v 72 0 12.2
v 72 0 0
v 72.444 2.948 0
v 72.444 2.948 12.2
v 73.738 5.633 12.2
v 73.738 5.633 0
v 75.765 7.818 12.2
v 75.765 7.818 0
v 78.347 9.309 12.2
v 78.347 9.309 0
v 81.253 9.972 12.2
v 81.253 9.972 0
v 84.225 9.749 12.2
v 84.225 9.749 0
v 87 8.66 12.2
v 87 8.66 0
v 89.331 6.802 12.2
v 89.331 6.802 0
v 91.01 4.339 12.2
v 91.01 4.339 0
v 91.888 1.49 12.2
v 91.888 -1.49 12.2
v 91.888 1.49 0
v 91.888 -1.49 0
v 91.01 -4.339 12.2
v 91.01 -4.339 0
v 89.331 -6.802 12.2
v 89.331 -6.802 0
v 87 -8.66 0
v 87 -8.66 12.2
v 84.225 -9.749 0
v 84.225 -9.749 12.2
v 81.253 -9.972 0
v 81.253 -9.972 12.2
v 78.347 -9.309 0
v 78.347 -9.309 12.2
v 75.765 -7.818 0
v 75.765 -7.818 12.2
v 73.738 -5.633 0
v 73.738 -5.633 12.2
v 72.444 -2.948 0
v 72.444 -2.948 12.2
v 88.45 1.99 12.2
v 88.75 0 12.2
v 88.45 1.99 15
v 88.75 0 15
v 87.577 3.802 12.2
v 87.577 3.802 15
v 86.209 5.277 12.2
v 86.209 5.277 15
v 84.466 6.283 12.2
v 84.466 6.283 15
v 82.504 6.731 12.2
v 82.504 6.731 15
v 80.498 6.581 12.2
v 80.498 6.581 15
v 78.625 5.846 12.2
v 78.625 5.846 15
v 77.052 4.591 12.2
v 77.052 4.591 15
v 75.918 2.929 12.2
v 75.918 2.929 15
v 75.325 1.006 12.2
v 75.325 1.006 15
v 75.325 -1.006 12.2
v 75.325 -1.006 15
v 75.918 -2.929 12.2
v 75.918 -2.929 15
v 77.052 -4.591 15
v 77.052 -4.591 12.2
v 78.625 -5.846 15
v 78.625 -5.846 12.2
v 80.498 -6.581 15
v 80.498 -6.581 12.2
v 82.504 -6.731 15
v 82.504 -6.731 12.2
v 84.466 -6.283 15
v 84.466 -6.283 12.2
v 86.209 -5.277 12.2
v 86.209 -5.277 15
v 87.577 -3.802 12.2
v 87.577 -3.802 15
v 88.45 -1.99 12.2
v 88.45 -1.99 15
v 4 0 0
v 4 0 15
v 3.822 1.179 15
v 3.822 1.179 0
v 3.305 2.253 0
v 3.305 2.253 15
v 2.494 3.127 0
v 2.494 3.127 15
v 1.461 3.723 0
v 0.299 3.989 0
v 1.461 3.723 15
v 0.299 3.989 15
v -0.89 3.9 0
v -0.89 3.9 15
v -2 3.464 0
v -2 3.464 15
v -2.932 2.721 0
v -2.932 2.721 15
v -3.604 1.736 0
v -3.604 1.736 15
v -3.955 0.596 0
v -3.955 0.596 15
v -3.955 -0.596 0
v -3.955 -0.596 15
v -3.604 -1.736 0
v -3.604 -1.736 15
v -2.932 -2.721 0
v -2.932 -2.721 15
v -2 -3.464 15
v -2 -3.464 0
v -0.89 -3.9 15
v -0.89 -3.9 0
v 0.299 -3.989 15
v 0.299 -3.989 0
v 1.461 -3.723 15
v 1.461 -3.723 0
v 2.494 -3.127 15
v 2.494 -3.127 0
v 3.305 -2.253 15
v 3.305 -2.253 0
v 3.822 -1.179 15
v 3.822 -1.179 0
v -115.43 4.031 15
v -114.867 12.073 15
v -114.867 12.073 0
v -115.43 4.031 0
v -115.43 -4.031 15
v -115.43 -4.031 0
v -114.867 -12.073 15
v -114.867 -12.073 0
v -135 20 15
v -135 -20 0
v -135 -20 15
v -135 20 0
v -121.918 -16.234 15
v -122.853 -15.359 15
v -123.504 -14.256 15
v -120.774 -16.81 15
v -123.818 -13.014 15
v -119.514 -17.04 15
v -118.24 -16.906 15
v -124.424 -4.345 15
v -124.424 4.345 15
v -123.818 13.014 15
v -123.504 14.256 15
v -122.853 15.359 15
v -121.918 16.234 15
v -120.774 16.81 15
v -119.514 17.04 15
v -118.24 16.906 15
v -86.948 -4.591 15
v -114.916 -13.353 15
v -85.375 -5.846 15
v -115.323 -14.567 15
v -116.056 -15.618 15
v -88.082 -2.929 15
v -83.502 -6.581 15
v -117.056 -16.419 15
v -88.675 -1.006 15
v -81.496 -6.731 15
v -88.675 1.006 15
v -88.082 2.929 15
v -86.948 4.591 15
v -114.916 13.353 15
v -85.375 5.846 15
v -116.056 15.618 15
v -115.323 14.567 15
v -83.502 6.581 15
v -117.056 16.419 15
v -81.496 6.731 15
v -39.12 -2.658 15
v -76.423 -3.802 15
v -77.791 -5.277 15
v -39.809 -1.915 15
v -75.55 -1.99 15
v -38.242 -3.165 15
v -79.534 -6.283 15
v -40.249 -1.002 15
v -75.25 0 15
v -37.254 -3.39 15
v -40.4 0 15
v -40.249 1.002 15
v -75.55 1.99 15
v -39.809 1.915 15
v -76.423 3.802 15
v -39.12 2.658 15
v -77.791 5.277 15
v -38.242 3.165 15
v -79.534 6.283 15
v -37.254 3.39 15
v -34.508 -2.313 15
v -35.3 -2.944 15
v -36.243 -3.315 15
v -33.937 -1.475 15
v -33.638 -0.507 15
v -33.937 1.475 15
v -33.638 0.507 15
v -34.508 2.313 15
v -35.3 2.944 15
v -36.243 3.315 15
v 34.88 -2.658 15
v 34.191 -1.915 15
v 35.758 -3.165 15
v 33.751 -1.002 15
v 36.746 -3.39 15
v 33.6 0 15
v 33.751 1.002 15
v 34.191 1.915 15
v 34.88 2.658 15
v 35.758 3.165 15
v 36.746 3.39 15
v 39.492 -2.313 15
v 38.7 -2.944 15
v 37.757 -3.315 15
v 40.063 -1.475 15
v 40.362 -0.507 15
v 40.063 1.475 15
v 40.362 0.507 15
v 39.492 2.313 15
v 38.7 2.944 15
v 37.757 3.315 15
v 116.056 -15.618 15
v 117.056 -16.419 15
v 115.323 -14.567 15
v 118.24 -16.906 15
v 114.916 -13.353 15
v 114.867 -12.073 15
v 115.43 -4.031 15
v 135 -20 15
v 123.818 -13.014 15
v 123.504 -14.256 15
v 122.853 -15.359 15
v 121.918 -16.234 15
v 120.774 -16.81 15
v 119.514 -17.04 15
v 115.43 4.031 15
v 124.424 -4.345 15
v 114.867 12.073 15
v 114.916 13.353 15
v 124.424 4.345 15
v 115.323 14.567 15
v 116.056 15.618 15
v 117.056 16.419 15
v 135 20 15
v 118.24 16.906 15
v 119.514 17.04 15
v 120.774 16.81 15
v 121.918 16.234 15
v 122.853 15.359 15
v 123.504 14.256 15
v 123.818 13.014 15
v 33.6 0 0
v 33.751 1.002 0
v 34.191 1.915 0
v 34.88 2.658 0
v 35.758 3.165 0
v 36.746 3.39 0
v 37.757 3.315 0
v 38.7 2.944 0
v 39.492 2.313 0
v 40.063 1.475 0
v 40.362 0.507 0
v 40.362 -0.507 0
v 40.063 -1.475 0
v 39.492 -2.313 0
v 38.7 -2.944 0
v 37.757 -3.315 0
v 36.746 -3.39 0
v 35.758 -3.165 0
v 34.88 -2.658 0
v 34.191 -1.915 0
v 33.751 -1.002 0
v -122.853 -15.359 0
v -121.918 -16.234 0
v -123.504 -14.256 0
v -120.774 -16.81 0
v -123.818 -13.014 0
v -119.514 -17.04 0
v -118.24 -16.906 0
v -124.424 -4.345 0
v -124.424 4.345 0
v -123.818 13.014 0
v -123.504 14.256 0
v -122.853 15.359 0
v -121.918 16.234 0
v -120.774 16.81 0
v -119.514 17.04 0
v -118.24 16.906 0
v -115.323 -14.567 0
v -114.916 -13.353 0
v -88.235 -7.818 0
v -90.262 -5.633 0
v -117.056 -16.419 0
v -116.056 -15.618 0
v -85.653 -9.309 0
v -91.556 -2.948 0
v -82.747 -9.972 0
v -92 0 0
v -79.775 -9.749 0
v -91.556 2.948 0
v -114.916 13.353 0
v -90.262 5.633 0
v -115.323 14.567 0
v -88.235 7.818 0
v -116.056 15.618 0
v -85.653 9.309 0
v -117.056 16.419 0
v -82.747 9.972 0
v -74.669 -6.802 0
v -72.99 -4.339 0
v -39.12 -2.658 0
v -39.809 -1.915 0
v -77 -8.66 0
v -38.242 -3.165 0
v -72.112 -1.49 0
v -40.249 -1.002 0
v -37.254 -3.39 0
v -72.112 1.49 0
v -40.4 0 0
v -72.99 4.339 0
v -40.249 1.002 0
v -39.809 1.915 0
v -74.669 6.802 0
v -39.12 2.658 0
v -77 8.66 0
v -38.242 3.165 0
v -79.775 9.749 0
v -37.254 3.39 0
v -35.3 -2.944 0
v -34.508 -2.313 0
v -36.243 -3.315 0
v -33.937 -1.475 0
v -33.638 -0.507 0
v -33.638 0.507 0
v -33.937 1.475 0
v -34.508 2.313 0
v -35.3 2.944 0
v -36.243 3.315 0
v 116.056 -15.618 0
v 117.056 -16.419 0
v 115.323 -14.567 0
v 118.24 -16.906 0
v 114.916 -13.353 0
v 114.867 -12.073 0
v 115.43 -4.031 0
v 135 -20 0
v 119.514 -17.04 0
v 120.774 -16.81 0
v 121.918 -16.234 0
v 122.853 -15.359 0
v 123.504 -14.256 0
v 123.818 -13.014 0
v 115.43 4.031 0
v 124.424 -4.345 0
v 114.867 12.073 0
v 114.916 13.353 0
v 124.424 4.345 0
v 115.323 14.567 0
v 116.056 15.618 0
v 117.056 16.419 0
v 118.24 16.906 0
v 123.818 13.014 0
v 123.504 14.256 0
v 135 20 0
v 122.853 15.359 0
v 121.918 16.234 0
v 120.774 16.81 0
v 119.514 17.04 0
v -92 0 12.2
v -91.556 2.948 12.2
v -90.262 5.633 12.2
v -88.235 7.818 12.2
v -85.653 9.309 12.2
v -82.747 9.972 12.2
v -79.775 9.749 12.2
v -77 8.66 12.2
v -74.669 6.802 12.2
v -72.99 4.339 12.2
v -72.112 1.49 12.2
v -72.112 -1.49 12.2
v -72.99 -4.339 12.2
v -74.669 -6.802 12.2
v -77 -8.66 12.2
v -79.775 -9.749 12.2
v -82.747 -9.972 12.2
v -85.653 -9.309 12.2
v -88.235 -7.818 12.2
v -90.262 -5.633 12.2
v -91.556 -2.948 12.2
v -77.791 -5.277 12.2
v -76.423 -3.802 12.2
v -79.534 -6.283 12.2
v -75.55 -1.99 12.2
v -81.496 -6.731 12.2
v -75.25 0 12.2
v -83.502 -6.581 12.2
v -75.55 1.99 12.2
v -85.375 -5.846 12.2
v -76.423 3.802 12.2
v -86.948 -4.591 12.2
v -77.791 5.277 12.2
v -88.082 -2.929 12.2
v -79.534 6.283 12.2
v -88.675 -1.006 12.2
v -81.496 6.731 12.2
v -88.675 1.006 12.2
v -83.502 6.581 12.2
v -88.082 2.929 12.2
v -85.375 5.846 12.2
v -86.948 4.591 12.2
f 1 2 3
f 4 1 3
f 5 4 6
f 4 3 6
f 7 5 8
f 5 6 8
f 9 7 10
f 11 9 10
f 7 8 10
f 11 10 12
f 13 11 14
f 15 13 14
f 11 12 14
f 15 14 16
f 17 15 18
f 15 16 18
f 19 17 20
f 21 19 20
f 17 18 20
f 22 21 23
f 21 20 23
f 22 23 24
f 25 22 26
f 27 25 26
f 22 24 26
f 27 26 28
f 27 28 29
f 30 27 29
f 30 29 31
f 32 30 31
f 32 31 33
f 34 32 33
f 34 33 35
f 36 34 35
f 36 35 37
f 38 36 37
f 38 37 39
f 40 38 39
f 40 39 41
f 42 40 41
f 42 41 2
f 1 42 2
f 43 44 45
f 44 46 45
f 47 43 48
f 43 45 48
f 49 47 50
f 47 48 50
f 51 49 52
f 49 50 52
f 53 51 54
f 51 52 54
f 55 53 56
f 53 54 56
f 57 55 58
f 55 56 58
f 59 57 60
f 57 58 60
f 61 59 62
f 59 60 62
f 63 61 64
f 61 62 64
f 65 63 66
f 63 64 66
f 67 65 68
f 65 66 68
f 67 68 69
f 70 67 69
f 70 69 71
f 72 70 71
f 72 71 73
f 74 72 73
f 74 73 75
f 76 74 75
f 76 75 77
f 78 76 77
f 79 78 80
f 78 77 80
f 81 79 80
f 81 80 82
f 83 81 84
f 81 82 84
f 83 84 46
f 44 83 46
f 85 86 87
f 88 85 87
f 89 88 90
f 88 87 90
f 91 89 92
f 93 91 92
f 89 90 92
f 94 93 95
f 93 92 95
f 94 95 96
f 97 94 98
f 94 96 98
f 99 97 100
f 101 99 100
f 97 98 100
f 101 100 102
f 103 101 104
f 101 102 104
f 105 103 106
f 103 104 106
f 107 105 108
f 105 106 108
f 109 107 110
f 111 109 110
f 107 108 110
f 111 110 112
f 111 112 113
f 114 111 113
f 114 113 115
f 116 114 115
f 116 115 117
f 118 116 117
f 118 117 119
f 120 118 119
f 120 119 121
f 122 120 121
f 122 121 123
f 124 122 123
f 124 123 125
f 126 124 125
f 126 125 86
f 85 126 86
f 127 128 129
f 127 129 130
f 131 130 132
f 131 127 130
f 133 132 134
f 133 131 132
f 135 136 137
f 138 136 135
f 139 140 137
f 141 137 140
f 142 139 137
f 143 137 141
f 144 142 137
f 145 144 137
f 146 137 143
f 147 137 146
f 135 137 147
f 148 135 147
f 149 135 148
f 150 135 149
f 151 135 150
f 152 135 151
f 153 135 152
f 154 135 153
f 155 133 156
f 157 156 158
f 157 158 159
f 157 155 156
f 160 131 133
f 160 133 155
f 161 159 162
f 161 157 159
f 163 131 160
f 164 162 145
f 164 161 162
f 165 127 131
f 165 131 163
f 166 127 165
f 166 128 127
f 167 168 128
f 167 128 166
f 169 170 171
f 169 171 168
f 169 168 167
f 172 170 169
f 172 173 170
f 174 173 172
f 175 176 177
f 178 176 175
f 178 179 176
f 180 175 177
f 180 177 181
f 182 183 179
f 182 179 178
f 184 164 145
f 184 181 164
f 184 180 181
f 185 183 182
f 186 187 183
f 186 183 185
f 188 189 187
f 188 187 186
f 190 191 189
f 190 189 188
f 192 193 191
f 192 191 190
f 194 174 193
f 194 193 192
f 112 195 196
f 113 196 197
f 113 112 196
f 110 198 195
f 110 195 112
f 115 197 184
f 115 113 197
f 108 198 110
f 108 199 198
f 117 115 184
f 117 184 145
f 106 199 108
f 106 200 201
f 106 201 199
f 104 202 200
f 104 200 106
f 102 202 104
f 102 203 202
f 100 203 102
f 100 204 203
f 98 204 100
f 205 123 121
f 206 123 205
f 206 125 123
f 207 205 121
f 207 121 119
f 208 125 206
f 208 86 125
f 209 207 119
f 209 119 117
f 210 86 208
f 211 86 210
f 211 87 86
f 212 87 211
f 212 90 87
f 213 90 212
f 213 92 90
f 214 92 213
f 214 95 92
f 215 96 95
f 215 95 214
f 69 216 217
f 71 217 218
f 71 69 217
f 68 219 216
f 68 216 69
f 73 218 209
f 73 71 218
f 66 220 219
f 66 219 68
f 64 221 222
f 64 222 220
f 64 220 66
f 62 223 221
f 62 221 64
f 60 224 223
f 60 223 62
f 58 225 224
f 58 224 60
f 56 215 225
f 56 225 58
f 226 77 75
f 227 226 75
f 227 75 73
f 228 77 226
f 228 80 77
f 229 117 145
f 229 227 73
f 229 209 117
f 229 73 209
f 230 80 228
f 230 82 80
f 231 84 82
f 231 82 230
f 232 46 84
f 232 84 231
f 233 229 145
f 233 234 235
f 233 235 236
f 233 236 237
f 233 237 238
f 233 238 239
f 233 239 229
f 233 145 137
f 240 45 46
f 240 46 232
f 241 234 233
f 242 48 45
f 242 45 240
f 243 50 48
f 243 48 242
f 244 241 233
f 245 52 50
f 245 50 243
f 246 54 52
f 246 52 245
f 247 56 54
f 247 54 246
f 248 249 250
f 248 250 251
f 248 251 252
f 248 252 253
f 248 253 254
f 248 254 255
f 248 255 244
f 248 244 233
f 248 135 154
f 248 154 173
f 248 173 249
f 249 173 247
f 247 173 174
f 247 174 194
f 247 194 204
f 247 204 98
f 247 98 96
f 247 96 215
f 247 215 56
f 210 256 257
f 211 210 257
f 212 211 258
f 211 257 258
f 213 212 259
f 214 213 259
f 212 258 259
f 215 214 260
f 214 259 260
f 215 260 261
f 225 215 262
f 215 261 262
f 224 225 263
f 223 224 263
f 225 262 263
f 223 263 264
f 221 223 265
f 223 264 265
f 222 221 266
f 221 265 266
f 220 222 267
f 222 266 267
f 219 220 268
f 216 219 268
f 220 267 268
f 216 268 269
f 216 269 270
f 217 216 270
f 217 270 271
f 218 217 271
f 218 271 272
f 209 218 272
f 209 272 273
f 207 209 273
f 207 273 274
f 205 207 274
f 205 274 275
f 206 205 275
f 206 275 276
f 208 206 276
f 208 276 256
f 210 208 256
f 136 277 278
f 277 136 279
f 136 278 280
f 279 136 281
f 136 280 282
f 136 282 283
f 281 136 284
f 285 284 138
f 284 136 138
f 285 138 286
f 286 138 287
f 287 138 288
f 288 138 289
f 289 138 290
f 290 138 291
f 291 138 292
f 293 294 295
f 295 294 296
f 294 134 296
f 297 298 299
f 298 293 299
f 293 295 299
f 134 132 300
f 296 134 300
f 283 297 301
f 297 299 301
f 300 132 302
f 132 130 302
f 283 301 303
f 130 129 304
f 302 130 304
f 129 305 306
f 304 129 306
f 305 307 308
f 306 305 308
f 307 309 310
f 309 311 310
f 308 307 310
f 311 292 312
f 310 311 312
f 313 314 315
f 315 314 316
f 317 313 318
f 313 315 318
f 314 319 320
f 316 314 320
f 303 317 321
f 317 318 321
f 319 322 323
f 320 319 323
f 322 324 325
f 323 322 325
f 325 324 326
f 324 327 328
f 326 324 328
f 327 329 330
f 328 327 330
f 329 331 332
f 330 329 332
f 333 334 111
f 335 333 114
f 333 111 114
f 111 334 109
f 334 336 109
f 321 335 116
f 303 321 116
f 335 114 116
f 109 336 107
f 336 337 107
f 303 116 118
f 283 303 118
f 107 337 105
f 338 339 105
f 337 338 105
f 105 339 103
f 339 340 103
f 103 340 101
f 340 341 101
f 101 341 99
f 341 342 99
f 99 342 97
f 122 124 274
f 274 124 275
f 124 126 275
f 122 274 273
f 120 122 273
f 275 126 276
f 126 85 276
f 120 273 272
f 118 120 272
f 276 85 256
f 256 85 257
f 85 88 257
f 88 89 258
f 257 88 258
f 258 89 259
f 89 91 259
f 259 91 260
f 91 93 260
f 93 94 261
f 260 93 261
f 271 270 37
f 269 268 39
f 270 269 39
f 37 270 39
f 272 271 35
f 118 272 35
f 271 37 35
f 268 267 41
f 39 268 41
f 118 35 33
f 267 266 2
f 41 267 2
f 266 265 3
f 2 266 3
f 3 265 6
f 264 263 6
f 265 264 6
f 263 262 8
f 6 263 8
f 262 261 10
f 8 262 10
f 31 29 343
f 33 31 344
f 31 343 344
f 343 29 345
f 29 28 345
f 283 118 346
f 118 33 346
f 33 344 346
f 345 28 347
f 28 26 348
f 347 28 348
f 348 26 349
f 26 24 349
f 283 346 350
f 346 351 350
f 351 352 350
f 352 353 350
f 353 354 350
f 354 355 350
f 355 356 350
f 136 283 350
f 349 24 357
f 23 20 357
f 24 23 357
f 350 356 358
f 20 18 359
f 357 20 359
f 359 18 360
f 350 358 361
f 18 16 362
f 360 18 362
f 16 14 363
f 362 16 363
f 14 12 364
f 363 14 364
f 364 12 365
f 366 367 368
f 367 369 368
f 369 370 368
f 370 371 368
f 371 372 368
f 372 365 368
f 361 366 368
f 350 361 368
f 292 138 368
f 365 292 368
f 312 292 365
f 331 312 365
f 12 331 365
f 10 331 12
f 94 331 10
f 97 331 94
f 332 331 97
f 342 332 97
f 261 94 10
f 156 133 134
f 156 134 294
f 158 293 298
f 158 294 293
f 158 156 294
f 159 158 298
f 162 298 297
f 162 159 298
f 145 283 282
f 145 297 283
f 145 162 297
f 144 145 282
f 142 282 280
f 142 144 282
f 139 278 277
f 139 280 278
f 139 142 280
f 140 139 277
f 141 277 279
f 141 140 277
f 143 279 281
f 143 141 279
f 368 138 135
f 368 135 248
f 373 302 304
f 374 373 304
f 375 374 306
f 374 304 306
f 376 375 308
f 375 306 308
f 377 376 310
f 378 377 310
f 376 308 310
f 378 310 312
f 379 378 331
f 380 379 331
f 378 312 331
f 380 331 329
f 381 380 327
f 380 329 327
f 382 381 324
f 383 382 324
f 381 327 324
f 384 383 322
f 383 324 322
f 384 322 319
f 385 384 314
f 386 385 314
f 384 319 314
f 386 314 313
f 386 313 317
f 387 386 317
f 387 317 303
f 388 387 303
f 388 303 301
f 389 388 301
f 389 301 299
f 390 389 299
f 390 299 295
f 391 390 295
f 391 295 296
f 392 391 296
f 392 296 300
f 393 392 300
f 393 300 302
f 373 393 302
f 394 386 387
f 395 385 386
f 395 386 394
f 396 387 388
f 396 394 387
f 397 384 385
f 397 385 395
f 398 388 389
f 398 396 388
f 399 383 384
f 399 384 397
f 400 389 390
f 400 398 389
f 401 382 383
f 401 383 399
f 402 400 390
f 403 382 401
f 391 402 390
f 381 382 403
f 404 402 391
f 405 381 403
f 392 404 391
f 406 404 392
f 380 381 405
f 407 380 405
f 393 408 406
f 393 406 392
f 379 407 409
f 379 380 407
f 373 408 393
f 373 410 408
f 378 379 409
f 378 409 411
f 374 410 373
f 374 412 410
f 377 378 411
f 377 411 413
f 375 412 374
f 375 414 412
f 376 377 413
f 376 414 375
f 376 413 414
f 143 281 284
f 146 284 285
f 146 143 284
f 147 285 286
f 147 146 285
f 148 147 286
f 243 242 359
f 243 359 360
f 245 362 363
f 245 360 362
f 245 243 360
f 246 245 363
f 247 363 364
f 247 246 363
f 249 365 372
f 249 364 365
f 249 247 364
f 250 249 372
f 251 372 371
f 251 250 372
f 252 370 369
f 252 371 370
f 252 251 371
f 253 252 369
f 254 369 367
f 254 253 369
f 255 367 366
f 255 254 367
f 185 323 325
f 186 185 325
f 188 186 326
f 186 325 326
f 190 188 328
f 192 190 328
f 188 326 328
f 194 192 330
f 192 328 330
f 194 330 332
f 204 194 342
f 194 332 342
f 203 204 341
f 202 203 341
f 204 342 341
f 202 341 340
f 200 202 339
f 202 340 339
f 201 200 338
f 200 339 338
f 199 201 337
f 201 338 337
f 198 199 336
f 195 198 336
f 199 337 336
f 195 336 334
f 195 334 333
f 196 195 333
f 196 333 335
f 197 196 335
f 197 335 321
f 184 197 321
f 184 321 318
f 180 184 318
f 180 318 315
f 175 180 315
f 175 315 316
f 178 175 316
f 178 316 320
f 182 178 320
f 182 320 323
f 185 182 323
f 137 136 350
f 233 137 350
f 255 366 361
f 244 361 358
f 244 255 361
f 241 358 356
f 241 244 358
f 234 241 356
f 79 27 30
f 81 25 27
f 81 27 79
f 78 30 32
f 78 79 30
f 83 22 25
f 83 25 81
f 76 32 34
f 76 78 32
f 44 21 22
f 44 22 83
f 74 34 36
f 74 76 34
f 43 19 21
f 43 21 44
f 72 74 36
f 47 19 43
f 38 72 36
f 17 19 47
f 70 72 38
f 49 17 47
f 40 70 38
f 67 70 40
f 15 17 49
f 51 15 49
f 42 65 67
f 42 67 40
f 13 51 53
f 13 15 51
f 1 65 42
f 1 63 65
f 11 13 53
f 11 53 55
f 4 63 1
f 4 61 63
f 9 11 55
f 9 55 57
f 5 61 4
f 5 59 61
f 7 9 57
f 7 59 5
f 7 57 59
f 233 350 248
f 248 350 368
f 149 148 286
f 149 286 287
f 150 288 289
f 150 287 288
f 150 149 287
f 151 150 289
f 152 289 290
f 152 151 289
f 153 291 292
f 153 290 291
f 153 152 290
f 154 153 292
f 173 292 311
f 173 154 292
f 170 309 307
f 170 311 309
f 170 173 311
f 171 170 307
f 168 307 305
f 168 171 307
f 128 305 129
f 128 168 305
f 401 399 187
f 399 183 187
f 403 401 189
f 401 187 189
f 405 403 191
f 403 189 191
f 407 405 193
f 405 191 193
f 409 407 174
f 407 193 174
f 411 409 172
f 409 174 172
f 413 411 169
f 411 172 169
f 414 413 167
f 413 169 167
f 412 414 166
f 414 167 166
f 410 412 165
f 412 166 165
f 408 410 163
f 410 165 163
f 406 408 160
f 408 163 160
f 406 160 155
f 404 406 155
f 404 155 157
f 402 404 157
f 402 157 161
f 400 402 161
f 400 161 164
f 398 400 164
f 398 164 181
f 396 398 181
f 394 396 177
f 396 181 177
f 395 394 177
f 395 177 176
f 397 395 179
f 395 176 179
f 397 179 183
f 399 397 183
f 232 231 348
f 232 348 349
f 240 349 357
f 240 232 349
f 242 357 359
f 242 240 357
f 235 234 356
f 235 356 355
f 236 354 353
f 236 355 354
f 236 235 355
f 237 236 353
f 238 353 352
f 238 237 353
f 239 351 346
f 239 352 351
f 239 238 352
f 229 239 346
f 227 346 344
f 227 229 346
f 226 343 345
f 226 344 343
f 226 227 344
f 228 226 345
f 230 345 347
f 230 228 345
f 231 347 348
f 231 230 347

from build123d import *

# Parameters (mm, degrees)
SKETCH_1_W                = 270
SKETCH_1_H                = 40
EXTRUDE_1_DEPTH           = 15
HOLE_WIZARD_1_D           = 13.5
HOLE_WIZARD_1_CBORE_D     = 20
HOLE_WIZARD_1_CBORE_DEPTH = 12.2
CUT_EXTRUDE_1_DEPTH       = 138.295302177
HOLE_WIZARD_M8_1_D        = 6.8
HOLE_WIZARD_1_2_D         = 8


with BuildPart() as part:
    # 草图1 → 凸台-拉伸1 (new body)
    with BuildSketch(Plane.XY):
        Rectangle(SKETCH_1_W, SKETCH_1_H)
    extrude(amount=EXTRUDE_1_DEPTH)

    # Hole Wizard 1 (through all)
    with Locations(Plane(origin=(0, 0, 0), x_dir=(-1, 0, 0), z_dir=(0, 0, -1))):
        with Locations((-82, 0), (82, 0)):
            CounterBoreHole(HOLE_WIZARD_1_D / 2, HOLE_WIZARD_1_CBORE_D / 2, HOLE_WIZARD_1_CBORE_DEPTH)

    # 草图4 → 切除-拉伸1 (cut, through all)
    with BuildSketch(Plane.XY.offset(15)):
        with BuildLine():
            ThreePointArc((114.867278915, -12.073037507), (115.5, 0), (114.867278915, 12.073037507))
            ThreePointArc((114.867278915, 12.073037507), (118.872249359, 17.018764121), (123.817975973, 13.013793677))
            ThreePointArc((123.817975973, 13.013793677), (124.5, 0), (123.817975973, -13.013793677))
            ThreePointArc((123.817975973, -13.013793677), (118.872249359, -17.018764121), (114.867278915, -12.073037507))
        make_face()
        with BuildLine():
            ThreePointArc((-114.867278915, -12.073037507), (-118.872249359, -17.018764121), (-123.817975973, -13.013793677))
            ThreePointArc((-123.817975973, -13.013793677), (-124.5, 0), (-123.817975973, 13.013793677))
            ThreePointArc((-123.817975973, 13.013793677), (-118.872249359, 17.018764121), (-114.867278915, 12.073037507))
            ThreePointArc((-114.867278915, 12.073037507), (-115.5, 0), (-114.867278915, -12.073037507))
        make_face()
    extrude(amount=-CUT_EXTRUDE_1_DEPTH, mode=Mode.SUBTRACT)

    # M8 螺纹孔1 (through all)
    with Locations(Plane.XY.offset(15)):
        with Locations((-37, 0), (37, 0)):
            Hole(HOLE_WIZARD_M8_1_D / 2)

    # Hole Wizard 1 2 (through all)
    with Locations(Plane(origin=(0, 0, 0), x_dir=(-1, 0, 0), z_dir=(0, 0, -1))):
        with Locations((0, 0)):
            Hole(HOLE_WIZARD_1_2_D / 2)


solid = part.part
